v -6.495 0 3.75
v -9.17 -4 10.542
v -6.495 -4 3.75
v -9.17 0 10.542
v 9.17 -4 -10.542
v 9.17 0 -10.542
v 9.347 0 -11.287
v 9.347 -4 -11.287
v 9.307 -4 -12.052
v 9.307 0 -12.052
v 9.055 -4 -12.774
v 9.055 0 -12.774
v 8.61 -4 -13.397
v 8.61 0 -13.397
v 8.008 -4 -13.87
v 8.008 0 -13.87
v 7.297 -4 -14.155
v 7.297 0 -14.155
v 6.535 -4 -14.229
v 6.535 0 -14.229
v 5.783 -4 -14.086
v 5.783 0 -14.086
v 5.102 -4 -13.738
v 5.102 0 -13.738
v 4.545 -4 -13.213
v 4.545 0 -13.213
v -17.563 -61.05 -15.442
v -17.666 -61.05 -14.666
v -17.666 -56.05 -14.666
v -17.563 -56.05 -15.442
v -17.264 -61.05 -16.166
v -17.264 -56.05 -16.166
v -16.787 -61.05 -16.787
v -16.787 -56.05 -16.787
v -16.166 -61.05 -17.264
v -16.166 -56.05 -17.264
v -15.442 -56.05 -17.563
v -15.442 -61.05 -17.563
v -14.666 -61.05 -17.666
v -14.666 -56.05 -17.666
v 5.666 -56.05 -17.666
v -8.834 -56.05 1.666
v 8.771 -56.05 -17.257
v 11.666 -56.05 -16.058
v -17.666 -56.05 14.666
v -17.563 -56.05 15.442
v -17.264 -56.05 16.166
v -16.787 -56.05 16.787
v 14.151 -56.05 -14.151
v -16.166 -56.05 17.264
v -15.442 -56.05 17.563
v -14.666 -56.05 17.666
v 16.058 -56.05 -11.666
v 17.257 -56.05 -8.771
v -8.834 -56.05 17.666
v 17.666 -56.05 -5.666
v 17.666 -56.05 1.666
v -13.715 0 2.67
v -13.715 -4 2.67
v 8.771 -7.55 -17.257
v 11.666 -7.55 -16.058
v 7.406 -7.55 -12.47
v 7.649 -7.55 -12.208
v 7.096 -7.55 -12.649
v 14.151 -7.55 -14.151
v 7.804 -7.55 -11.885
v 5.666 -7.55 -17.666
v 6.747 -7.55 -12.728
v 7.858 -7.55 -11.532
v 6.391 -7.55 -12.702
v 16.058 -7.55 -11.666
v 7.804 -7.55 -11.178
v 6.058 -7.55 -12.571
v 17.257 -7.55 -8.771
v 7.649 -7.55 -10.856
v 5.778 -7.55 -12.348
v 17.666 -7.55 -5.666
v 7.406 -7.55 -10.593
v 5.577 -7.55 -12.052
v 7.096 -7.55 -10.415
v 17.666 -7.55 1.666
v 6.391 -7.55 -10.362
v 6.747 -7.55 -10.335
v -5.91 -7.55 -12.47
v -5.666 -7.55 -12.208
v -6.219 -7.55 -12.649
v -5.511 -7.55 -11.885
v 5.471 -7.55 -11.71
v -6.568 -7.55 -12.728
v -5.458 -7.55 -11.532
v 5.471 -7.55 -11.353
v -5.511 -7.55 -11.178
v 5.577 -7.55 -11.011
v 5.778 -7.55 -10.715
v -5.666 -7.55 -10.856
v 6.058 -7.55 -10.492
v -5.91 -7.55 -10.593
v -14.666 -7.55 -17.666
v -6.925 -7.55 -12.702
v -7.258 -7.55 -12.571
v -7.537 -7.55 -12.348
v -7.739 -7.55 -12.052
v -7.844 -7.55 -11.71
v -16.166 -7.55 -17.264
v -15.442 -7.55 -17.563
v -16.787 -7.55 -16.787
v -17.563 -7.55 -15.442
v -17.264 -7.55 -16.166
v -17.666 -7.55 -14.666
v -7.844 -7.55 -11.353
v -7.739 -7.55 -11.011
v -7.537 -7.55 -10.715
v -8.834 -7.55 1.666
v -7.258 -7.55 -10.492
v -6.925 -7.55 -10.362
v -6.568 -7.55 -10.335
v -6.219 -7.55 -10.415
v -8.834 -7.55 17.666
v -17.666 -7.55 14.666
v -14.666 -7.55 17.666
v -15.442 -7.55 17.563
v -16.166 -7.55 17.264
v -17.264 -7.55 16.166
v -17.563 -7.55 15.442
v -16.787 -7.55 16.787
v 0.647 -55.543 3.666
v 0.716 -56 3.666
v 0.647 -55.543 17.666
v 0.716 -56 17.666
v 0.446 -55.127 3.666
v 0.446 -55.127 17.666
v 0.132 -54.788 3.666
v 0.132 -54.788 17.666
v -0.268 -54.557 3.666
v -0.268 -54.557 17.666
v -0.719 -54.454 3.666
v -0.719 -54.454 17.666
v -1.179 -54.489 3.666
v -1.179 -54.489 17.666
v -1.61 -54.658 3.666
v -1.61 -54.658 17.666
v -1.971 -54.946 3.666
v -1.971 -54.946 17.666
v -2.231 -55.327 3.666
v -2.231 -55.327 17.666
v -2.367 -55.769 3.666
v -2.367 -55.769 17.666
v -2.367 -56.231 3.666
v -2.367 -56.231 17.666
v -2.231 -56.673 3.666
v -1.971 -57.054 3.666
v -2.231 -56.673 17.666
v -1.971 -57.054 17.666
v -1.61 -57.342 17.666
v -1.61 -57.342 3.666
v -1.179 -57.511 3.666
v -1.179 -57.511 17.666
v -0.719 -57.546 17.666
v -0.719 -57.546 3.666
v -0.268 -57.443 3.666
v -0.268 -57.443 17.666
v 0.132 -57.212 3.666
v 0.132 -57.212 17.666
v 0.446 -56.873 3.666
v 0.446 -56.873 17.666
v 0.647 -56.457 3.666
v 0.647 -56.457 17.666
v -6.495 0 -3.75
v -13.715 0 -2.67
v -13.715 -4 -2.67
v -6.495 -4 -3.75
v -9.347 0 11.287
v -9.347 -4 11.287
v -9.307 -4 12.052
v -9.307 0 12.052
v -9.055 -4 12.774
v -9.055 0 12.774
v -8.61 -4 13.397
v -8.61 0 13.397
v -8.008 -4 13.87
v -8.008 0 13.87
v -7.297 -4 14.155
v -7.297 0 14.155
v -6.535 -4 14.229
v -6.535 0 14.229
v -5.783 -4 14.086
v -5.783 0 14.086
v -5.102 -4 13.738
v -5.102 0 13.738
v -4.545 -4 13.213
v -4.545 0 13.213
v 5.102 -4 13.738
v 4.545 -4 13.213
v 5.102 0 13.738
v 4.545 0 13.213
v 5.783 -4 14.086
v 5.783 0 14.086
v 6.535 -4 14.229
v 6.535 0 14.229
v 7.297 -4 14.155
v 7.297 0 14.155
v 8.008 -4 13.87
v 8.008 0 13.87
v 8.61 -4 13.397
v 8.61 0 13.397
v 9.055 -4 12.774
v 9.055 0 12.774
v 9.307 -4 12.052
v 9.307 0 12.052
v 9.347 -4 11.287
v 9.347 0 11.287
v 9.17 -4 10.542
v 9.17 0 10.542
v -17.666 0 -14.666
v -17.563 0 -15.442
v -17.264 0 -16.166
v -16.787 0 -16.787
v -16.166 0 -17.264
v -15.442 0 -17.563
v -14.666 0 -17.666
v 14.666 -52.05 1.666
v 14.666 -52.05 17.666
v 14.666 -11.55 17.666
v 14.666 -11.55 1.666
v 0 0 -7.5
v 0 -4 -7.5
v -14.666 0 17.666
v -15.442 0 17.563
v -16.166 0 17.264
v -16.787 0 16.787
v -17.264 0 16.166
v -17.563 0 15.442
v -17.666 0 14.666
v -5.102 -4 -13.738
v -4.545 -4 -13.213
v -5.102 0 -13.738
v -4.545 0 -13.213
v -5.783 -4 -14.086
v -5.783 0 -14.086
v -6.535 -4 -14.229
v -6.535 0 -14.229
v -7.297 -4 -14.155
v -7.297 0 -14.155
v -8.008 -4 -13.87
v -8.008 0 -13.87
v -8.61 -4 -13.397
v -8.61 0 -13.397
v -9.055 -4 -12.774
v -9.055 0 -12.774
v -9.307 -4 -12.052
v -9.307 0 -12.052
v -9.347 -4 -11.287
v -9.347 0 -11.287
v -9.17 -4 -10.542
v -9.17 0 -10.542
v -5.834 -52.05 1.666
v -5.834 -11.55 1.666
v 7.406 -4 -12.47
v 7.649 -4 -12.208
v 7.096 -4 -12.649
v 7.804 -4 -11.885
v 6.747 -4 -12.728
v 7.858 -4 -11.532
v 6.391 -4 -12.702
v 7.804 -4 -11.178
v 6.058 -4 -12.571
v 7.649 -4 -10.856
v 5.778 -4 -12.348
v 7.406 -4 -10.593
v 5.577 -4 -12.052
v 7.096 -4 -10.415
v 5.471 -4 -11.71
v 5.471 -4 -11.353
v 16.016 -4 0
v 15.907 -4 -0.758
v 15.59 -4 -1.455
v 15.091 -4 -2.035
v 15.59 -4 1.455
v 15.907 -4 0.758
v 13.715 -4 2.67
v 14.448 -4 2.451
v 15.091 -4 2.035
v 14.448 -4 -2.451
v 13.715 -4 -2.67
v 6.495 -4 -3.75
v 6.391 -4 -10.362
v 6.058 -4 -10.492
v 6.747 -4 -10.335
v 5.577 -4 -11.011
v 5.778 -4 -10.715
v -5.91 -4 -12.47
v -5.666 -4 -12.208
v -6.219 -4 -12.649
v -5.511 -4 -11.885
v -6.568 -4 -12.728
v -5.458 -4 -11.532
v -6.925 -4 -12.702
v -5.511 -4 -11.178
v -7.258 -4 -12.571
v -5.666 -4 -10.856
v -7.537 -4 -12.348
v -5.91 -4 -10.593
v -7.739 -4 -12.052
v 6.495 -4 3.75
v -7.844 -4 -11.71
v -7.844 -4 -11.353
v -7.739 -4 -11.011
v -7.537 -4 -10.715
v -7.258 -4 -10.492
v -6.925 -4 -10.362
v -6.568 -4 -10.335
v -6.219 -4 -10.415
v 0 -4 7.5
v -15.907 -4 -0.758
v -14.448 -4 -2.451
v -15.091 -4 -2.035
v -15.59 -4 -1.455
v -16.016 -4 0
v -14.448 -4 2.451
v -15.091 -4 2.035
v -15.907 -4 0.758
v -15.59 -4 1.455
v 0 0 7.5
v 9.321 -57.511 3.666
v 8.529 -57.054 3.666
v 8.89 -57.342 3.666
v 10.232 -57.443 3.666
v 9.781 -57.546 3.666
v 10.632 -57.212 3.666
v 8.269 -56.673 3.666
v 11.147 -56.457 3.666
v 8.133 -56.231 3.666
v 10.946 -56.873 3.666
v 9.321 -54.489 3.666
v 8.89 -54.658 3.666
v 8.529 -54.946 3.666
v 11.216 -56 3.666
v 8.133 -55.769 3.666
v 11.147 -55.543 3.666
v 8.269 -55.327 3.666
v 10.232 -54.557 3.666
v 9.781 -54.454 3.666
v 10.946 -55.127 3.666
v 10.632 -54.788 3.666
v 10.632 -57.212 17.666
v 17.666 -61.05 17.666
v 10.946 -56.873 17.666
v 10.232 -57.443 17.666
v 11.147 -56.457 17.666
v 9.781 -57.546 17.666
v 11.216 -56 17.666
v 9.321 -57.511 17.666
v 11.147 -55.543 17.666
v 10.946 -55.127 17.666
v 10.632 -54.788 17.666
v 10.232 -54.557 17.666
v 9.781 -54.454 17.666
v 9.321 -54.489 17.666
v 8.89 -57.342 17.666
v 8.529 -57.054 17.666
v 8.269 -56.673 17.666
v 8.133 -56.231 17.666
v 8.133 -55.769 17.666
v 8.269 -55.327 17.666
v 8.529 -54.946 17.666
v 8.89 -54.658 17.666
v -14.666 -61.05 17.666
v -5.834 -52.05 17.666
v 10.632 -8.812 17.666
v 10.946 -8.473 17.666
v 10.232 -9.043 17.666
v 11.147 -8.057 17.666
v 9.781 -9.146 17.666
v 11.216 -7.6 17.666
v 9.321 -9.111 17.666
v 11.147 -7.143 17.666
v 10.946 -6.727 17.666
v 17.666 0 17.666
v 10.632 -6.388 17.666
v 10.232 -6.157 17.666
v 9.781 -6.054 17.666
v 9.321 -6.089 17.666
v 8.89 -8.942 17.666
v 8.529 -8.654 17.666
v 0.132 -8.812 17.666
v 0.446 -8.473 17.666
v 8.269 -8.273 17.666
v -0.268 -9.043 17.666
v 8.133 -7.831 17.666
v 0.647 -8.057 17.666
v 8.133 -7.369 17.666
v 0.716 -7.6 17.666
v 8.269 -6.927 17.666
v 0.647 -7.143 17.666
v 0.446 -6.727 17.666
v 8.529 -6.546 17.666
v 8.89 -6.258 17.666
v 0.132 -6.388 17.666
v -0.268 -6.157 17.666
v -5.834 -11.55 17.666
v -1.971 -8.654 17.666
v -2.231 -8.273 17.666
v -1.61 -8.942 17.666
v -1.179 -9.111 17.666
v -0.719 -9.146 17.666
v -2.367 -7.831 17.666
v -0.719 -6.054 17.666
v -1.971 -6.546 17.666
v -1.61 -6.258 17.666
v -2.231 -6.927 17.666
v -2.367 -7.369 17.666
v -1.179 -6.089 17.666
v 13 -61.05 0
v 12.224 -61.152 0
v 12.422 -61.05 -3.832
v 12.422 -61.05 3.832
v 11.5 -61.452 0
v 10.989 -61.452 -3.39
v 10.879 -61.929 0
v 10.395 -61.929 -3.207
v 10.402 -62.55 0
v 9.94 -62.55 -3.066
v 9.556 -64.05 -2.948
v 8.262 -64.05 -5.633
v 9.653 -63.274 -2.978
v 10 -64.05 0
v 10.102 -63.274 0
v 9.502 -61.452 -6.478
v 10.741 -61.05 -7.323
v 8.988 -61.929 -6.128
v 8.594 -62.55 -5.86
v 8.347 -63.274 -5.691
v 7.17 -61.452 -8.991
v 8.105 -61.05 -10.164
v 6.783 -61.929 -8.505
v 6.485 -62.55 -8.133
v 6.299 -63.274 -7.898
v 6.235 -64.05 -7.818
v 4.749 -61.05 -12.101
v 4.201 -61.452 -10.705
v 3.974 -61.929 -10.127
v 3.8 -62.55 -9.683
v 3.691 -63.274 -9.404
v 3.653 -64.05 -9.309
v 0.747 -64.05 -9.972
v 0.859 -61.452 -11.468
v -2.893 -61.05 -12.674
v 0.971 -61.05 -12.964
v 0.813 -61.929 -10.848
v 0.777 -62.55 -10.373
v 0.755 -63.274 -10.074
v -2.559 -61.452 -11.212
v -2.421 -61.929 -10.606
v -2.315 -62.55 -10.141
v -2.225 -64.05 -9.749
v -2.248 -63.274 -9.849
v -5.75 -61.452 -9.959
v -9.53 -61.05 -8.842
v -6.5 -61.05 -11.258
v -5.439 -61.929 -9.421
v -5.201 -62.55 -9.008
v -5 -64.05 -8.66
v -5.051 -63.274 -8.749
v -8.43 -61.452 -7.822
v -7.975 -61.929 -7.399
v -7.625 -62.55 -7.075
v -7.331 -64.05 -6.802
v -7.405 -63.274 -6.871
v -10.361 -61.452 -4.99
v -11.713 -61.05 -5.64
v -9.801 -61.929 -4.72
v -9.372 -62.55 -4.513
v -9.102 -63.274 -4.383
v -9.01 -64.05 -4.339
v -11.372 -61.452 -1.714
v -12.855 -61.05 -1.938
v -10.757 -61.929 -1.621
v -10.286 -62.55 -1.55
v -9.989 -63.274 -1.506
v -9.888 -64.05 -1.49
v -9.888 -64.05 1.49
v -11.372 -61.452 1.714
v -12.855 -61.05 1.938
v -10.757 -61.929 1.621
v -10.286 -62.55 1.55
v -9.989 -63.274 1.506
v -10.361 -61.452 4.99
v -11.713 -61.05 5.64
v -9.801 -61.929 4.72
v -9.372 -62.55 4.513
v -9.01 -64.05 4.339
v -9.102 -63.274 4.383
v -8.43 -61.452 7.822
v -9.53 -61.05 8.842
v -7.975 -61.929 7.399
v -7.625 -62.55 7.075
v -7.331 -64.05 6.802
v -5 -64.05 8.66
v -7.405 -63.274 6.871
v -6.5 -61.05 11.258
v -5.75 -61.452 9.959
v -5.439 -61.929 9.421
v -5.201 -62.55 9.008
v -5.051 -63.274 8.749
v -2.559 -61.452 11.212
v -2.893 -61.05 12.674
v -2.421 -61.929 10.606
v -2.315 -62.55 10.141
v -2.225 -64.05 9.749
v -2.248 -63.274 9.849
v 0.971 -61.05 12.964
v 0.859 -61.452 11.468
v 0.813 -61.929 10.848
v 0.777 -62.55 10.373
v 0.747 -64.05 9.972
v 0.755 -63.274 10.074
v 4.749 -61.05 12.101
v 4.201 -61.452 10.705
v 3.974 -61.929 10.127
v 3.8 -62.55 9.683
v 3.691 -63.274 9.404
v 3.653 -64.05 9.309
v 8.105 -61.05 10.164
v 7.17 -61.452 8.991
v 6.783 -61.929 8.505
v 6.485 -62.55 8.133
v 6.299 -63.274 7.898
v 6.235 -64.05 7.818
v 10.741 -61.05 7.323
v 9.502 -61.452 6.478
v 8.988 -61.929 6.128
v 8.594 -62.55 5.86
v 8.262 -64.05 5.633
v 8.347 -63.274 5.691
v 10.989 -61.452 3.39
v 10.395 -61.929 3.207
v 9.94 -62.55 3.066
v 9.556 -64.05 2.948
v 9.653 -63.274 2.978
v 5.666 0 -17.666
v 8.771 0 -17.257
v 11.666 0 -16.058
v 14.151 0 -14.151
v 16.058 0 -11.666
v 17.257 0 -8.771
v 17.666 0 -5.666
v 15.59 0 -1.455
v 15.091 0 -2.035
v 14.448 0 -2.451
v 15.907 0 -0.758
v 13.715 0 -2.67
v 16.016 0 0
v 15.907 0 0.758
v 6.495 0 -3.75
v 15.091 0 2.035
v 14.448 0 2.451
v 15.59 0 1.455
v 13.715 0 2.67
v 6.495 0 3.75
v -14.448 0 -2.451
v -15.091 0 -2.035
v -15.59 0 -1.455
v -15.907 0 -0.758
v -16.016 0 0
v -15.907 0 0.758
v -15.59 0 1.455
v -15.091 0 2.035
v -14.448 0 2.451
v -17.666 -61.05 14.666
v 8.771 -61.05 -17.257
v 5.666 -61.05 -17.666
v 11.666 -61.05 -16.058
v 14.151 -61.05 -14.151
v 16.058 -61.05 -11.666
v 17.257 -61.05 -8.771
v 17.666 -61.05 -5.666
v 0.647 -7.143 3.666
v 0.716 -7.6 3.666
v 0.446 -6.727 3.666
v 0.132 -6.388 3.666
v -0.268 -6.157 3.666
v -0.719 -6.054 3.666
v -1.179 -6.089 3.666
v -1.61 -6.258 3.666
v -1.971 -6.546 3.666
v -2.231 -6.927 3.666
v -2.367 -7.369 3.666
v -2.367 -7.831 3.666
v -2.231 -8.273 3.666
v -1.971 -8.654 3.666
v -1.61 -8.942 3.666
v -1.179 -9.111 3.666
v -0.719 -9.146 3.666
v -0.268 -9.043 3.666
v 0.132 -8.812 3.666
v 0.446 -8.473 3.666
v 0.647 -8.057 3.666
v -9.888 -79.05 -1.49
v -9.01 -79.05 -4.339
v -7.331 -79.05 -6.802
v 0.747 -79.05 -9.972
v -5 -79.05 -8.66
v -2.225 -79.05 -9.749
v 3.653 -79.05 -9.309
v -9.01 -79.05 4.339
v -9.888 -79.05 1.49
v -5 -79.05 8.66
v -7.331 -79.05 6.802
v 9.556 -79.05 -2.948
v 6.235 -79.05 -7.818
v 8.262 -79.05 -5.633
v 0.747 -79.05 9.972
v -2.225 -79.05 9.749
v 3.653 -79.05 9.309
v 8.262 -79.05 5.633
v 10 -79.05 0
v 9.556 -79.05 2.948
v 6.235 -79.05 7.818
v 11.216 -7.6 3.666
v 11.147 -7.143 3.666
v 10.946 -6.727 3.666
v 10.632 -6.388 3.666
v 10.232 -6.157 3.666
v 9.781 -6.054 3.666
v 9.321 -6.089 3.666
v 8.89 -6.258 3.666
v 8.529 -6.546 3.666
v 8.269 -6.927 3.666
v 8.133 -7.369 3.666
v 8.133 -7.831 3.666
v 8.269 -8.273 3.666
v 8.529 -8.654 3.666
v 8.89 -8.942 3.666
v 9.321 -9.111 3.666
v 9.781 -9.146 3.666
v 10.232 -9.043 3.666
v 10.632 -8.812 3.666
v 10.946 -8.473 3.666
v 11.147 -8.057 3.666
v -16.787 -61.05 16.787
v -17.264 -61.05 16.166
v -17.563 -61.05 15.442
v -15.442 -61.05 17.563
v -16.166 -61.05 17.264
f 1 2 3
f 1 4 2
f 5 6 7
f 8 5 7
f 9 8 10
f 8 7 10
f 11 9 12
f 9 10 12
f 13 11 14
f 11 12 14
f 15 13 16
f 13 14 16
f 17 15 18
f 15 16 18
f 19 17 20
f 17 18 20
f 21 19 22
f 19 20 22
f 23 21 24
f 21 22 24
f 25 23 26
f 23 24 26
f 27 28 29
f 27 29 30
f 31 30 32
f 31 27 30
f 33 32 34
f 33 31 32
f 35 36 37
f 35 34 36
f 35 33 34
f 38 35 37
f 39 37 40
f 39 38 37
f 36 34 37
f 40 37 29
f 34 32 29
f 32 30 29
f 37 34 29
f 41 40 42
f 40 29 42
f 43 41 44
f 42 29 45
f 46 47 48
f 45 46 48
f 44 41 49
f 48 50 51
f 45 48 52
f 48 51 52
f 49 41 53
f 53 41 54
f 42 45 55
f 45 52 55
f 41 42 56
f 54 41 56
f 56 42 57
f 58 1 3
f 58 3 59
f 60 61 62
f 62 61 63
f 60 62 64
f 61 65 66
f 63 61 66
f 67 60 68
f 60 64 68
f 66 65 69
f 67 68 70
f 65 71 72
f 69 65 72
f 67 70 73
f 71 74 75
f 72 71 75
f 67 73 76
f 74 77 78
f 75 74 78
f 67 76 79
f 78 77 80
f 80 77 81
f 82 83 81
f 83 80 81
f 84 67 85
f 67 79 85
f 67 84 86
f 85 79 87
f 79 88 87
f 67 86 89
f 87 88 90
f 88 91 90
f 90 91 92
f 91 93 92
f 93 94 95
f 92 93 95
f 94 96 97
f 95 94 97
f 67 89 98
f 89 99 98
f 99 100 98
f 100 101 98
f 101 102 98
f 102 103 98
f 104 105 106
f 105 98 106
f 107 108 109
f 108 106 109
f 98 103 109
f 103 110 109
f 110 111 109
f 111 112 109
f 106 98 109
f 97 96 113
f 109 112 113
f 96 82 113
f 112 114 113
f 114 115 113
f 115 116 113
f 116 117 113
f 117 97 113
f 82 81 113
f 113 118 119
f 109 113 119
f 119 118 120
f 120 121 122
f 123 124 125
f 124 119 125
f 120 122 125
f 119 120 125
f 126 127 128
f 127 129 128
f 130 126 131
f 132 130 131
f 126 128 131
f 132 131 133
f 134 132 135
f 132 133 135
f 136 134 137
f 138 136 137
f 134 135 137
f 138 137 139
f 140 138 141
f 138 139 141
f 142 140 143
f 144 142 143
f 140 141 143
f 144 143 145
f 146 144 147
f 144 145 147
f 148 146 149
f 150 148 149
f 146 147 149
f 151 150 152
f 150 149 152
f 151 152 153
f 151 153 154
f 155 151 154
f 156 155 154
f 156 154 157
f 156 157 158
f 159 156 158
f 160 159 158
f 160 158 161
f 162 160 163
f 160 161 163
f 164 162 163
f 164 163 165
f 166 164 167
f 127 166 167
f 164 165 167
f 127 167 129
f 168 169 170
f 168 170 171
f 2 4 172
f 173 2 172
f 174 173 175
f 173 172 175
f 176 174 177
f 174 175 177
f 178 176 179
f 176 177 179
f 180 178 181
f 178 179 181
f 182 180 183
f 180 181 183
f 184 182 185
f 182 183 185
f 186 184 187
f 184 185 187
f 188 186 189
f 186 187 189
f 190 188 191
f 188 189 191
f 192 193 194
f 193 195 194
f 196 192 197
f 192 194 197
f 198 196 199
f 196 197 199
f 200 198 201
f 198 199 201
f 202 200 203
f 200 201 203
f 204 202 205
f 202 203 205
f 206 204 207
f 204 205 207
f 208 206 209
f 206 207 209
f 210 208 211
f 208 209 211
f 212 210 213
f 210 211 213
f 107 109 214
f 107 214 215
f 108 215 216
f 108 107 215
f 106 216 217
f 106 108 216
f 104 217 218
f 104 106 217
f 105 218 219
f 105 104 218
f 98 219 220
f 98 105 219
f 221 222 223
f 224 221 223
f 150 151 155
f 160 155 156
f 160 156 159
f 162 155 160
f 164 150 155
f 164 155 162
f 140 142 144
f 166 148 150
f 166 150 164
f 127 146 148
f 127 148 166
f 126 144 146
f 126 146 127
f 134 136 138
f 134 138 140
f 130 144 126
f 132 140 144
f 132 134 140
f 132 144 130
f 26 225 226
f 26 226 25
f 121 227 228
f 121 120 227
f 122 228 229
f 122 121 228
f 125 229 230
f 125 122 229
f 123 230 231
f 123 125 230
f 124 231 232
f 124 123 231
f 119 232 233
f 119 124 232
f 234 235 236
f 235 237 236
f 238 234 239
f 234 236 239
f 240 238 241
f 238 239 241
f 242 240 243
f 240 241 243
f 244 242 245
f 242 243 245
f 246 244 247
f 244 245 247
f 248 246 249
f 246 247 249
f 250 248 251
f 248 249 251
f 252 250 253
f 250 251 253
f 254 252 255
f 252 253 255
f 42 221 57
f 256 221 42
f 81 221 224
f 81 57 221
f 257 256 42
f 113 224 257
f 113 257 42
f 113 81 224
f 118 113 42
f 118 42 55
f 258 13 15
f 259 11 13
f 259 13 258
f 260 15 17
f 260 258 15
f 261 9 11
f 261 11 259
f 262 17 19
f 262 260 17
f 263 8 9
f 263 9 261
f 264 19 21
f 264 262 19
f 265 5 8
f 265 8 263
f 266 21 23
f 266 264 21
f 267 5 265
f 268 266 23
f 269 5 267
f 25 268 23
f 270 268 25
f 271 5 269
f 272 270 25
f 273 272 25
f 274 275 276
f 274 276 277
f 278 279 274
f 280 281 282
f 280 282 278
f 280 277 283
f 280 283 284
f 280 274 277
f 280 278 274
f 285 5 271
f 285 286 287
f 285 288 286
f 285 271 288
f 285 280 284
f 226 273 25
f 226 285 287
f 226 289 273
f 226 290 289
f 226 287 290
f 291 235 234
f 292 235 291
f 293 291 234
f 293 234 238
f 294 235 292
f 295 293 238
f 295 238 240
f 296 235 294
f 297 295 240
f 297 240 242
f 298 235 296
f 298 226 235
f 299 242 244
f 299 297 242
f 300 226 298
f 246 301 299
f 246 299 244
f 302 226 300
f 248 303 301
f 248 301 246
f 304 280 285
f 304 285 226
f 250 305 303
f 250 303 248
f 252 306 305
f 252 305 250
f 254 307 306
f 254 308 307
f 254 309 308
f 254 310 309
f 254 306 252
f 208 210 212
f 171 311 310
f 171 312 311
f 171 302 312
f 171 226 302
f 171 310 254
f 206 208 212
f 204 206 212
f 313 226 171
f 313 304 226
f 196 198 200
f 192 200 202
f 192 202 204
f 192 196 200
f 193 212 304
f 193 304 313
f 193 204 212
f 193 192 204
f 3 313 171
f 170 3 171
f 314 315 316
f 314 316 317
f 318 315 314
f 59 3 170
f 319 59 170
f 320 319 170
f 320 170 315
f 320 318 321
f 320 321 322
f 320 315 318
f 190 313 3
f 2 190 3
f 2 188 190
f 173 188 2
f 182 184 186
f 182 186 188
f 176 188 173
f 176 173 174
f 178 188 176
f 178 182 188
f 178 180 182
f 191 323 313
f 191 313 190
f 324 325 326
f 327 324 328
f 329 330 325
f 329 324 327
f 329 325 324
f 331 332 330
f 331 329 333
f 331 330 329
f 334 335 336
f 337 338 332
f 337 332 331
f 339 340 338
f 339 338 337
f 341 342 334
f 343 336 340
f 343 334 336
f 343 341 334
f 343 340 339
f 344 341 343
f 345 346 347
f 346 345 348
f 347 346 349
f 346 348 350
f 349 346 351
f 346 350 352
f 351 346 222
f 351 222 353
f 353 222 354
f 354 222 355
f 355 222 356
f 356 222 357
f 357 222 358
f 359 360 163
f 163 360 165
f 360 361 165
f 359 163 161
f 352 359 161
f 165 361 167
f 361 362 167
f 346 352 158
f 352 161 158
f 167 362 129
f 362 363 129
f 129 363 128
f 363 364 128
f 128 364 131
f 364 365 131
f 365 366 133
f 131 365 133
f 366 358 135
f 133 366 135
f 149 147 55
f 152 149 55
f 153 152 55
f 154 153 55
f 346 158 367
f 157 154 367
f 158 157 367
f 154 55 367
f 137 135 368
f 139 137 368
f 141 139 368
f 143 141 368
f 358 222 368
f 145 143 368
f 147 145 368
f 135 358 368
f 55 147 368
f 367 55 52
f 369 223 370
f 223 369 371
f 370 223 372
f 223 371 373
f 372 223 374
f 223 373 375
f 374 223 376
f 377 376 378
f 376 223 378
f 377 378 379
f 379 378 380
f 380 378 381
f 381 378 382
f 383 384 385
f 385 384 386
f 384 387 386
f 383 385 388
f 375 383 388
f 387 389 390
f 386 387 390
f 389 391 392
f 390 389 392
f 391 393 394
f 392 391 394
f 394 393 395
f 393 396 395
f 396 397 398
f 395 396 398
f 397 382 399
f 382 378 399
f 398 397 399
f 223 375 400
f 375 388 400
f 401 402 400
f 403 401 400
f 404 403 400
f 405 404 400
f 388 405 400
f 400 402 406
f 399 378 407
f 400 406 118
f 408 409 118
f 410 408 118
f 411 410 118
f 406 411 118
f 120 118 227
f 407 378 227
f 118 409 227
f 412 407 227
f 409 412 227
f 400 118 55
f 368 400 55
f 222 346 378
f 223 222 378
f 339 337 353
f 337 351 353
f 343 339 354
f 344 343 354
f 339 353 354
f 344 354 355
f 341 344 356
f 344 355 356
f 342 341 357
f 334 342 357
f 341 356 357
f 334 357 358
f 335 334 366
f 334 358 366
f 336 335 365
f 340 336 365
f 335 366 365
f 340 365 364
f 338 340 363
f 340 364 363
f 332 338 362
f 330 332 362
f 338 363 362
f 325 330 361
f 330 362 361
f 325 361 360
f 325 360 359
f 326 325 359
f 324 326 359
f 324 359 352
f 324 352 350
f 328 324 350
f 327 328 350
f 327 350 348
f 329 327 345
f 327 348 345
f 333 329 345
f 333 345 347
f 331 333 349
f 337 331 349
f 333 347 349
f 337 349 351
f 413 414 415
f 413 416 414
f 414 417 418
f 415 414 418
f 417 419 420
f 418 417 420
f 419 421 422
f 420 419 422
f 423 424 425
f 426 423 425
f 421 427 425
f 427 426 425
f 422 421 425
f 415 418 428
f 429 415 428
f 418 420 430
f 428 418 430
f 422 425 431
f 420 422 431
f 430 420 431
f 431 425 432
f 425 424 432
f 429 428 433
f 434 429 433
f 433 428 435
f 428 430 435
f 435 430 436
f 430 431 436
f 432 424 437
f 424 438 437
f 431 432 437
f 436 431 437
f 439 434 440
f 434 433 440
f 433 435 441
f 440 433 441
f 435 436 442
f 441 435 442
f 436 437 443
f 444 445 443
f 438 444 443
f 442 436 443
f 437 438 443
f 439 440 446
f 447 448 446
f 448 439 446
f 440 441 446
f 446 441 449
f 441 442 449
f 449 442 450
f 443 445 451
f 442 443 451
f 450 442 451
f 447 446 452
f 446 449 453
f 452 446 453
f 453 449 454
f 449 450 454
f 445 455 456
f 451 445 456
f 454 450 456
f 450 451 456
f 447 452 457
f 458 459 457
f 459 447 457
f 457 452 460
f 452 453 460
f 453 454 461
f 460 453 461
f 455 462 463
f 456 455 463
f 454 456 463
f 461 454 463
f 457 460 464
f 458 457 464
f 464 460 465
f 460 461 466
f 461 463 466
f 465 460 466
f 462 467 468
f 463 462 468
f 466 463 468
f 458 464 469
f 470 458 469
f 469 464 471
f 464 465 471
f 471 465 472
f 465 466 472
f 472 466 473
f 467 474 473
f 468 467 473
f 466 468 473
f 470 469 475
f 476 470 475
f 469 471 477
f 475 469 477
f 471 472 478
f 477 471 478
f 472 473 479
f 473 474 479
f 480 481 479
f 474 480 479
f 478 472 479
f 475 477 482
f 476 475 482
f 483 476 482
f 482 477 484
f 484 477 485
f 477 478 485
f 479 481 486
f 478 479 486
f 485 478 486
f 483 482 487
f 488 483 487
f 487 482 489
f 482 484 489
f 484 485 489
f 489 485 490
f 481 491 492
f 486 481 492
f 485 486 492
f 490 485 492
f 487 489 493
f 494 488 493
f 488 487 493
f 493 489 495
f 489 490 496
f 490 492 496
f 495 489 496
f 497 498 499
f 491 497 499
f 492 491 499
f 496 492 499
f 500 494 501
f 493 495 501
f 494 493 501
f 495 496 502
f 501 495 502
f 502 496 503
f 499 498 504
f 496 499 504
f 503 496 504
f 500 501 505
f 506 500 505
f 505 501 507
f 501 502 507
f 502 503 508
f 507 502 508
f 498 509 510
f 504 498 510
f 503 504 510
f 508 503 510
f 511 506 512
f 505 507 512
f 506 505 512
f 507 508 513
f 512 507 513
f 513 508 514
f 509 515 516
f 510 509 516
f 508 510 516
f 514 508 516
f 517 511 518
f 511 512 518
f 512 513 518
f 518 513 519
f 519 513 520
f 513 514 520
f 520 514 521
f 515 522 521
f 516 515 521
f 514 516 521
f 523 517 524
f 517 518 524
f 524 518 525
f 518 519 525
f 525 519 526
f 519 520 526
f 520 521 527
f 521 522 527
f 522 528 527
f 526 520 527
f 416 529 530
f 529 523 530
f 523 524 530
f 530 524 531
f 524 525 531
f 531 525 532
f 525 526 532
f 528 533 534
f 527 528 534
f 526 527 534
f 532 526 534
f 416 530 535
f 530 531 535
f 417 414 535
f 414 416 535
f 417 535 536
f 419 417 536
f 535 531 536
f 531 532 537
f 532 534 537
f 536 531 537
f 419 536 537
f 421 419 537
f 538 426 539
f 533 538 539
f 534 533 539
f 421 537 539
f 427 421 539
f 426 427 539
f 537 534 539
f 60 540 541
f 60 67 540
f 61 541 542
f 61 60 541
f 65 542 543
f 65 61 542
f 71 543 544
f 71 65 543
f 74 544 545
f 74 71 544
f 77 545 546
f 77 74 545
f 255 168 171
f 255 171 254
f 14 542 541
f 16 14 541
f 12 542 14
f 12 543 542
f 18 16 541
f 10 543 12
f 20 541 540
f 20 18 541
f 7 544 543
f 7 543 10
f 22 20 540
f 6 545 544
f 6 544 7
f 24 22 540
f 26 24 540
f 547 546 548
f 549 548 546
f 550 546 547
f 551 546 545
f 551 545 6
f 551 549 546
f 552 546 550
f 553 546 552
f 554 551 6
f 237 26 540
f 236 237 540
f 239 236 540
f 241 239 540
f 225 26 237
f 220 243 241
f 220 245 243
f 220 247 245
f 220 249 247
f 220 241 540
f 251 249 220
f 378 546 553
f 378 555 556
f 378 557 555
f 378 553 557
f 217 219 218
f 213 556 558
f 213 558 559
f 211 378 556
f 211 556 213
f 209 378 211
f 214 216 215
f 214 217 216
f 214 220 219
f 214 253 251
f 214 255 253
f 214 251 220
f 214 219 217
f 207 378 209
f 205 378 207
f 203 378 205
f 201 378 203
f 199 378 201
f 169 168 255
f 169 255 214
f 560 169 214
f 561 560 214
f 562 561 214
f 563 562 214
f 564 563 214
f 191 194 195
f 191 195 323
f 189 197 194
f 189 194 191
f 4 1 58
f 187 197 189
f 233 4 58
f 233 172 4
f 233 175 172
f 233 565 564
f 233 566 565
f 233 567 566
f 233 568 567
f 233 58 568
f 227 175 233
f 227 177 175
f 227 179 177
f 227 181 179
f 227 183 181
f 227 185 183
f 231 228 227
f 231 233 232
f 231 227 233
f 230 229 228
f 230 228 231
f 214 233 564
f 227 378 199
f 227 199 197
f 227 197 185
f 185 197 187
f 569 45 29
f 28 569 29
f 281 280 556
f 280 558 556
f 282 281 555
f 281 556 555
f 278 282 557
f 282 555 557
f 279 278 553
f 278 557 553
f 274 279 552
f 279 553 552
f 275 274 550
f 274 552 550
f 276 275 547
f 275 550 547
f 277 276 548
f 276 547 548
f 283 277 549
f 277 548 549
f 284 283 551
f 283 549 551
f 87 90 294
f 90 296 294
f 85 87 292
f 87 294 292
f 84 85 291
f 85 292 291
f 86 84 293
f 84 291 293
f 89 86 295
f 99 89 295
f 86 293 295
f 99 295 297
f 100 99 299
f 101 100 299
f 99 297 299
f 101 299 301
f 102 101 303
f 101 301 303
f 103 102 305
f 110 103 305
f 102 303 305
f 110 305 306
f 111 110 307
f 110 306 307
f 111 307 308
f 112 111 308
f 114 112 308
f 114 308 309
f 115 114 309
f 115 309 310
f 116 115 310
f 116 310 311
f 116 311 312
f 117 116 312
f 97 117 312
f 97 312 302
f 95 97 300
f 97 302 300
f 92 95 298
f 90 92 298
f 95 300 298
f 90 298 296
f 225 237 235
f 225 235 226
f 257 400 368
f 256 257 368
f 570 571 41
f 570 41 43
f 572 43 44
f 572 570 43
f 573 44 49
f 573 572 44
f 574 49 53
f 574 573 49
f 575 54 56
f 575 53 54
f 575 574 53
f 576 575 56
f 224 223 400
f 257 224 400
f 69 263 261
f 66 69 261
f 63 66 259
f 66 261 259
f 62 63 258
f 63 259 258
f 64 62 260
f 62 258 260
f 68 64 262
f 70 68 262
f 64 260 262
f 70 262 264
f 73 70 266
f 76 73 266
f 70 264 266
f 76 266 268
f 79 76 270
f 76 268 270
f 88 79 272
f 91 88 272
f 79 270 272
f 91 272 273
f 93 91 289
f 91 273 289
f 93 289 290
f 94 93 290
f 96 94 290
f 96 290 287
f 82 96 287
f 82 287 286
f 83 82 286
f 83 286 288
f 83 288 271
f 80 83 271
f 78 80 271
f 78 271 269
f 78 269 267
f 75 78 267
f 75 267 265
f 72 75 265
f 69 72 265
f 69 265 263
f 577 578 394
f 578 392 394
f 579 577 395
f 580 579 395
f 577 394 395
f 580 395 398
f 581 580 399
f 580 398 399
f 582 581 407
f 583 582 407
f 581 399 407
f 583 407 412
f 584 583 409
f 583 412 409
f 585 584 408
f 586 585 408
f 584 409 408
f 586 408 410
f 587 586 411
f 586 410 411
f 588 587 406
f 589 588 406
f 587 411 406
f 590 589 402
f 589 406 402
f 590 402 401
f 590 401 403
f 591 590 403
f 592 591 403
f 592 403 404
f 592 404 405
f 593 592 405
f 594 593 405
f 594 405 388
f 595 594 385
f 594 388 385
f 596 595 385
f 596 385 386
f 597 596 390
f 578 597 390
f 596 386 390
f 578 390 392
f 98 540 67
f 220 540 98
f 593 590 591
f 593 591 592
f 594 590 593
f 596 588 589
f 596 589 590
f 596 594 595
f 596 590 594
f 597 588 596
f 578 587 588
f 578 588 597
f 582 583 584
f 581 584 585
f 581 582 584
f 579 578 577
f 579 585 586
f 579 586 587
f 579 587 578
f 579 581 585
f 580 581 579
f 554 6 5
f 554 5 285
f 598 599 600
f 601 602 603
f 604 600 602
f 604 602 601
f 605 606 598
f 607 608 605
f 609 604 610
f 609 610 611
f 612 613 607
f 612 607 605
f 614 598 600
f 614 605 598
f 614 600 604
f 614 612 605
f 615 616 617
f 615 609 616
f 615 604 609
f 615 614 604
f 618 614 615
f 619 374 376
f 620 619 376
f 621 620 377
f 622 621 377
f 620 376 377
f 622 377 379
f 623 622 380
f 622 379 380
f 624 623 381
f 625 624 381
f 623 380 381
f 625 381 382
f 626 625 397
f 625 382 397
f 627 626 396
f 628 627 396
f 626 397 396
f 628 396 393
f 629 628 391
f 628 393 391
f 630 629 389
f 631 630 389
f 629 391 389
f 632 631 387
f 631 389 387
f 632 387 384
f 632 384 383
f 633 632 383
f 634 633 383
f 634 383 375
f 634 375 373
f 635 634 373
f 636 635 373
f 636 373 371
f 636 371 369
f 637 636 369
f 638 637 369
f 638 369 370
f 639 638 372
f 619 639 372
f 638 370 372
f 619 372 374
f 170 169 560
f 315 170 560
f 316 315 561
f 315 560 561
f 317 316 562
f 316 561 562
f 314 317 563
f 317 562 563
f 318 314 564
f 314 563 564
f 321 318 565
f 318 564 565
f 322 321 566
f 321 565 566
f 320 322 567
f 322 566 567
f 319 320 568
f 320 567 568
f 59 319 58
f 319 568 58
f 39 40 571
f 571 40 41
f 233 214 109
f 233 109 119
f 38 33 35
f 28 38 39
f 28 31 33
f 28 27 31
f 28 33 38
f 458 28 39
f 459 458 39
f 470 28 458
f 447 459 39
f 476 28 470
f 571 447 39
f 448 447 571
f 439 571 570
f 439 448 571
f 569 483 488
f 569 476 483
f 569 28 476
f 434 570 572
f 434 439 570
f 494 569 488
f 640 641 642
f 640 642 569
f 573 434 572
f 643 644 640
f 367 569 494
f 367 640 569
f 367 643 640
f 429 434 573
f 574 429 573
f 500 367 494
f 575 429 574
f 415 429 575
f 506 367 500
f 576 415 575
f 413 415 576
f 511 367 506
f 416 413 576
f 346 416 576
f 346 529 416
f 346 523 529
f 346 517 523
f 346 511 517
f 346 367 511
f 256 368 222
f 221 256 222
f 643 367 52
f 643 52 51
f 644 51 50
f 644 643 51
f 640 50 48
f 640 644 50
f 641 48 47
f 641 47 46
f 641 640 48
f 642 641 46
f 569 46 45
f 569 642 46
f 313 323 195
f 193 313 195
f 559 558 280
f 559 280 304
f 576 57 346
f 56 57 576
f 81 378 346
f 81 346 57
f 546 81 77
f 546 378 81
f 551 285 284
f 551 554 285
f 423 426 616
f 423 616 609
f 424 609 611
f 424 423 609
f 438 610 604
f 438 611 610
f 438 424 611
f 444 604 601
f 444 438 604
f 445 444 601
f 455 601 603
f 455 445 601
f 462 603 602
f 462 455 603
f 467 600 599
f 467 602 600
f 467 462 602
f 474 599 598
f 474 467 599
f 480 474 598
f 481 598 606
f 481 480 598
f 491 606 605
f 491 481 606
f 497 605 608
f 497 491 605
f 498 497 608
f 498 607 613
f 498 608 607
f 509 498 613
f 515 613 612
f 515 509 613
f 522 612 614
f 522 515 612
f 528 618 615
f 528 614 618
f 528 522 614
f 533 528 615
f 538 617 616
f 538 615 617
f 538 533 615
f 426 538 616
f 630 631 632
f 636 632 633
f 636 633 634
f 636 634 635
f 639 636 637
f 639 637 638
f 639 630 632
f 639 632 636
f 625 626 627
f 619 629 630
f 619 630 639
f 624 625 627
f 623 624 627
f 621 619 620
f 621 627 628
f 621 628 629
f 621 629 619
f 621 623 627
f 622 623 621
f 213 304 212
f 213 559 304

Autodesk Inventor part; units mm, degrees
ref_plane "YZ Plane" through (0, 0, 0) normal (1, 0, 0) x (0, 1, 0)
ref_plane "XZ Plane" through (0, 0, 0) normal (0, 1, 0) x (-1, 0, 0)
ref_plane "XY Plane" through (0, 0, 0) normal (0, 0, 1) x (1, 0, 0)
sketch "Boceto1" plane through (0, 0, 0) normal (0, 1, 0) x (-1, 0, 0)
  circle A0 centre (0, 0) radius 7.5 construction
  line L0 (0, 7.5) -> (4.5449, 13.2126)
  arc A1 (9.17, 10.5423) -> (4.5449, 13.2126) centre (6.6578, 11.5316) ccw
  line L1 (9.17, 10.5423) -> (6.4952, 3.75)
  line L2 (6.4952, 3.75) -> (13.7149, 2.6703)
  arc A2 (13.7149, -2.6703) -> (13.7149, 2.6703) centre (13.3156, 0) ccw
  line L3 (13.7149, -2.6703) -> (6.4952, -3.75)
  line L4 (6.4952, -3.75) -> (9.17, -10.5423)
  arc A3 (4.5449, -13.2126) -> (9.17, -10.5423) centre (6.6578, -11.5316) ccw
  line L5 (4.5449, -13.2126) -> (0, -7.5)
  line L6 (0, -7.5) -> (-4.5449, -13.2126)
  arc A4 (-9.17, -10.5423) -> (-4.5449, -13.2126) centre (-6.6578, -11.5316) ccw
  line L7 (-9.17, -10.5423) -> (-6.4952, -3.75)
  line L8 (-6.4952, -3.75) -> (-13.7149, -2.6703)
  arc A5 (-13.7149, 2.6703) -> (-13.7149, -2.6703) centre (-13.3156, 0) ccw
  line L9 (-13.7149, 2.6703) -> (-6.4952, 3.75)
  line L10 (-6.4952, 3.75) -> (-9.17, 10.5423)
  line L11 (0, 7.5) -> (-4.5449, 13.2126)
  arc A6 (-4.5449, 13.2126) -> (-9.17, 10.5423) centre (-6.6578, 11.5316) ccw
  dimension "d6" = 15
  dimension "d11" = 2.7
  dimension "d12" = 7.3
  dimension "d13" = 60
sketch "Boceto2" plane through (0, 0, 0) normal (0, 1, 0) x (-1, 0, 0)
  line L0 (17.6656, 17.6656) -> (-17.6656, 17.6656)
  line L1 (-17.6656, 17.6656) -> (-17.6656, -17.6656)
  line L2 (-17.6656, -17.6656) -> (17.6656, -17.6656)
  line L3 (17.6656, -17.6656) -> (17.6656, 17.6656)
  arc A0 (-13.7149, 2.6703) -> (-13.7149, -2.6703) centre (-13.3156, 0) ccw projected
  point P0 (0, 0)
  point P1 (0, -17.6656)
  point P2 (17.6656, 0)
  dimension "d14" = 4.35
  dimension "profundidad_hombro" = 35.3311
extrude "Extrusión1" add sketch "Boceto2" against normal blind 7.55
extrude "Extrusión2" cut sketch "Boceto1" against normal blind 4
sketch "Boceto3" plane through (0, -7.55, 0) normal (0, -1, 0) x (1, 0, 0)
  line L0 (17.6656, -17.6656) -> (-17.6656, -17.6656) construction
  line L1 (-8.8344, 17.6656) -> (17.6656, 17.6656)
  line L2 (17.6656, 17.6656) -> (17.6656, 1.6656)
  line L3 (17.6656, 1.6656) -> (-8.8344, 1.6656)
  line L4 (-8.8344, 1.6656) -> (-8.8344, 17.6656)
  line L5 (17.6656, 17.6656) -> (-17.6656, 17.6656) projected
  line L6 (17.6656, 17.6656) -> (-17.6656, 17.6656) projected
  line L7 (-17.6656, 17.6656) -> (-17.6656, -17.6656) projected
  line L8 (-17.6656, -17.6656) -> (17.6656, -17.6656) projected
  line L9 (17.6656, -17.6656) -> (17.6656, 17.6656) projected
  point P0 (0, 0)
  point P1 (-2.7738, 1.6656)
  dimension "d20" = 16
  dimension "d59" = 26.5
extrude "Extrusión3" add sketch "Boceto3" along normal blind 48.5 contours L1 L2 L3 L4
sketch "Boceto4" plane through (0, -56.05, 0) normal (0, -1, 0) x (1, 0, 0)
  line L0 (17.6656, 17.6656) -> (17.6656, -17.6656) projected
  line L1 (-17.6656, -17.6656) -> (17.6656, -17.6656)
  line L2 (17.6656, -17.6656) -> (17.6656, 17.6656)
  line L3 (17.6656, 17.6656) -> (-17.6656, 17.6656)
  line L4 (-17.6656, 17.6656) -> (-17.6656, -17.6656)
  point P0 (0, 0)
extrude "Extrusión4" add sketch "Boceto4" along normal blind 5
sketch "Boceto5" plane through (0, -61.05, 0) normal (0, -1, 0) x (1, 0, 0)
  circle A0 centre (0, 0) radius 10
  dimension "diametro_eje_hombro" = 20
extrude "Extrusión5" add sketch "Boceto5" along normal blind 18
sketch "Sketch11" plane through (-17.6656, 0, 17.6656) normal (0, 0, 1) x (1, 0, 0)
  line L0 (11.8311, -52.05) -> (32.3311, -52.05)
  line L1 (32.3311, -52.05) -> (32.3311, -11.55)
  line L2 (32.3311, -11.55) -> (11.8311, -11.55)
  line L3 (11.8311, -11.55) -> (11.8311, -52.05)
  line L4 (8.8311, -7.55) -> (8.8311, -56.05) projected
  line L5 (35.3311, 0) -> (35.3311, -61.05) projected
  point P0 (17.6656, 0)
  point P1 (11.8311, -31.8)
  point P2 (8.8311, -31.8)
  dimension "d60" = 40.5
  dimension "d61" = 3
  dimension "d62" = 3
extrude "Extrusion12" cut sketch "Sketch11" against normal up to surface (16 mm away)
sketch "Sketch12" plane through (-17.6656, 0, 17.6656) normal (0, 0, 1) x (1, 0, 0)
  circle A0 centre (16.8311, -56) radius 1.55
  circle A1 centre (27.3311, -56) radius 1.55
  circle A2 centre (27.3311, -7.6) radius 1.55
  circle A3 centre (16.8311, -7.6) radius 1.55
  line L0 (32.3311, -52.05) -> (11.8311, -52.05) projected
  line L1 (11.8311, -11.55) -> (32.3311, -11.55) projected
  line L2 (32.3311, -11.55) -> (32.3311, -52.05) projected
  line L3 (11.8311, -52.05) -> (11.8311, -11.55) projected
  point P0 (17.6656, 0)
  dimension "d65" = 3.1
  dimension "d66" = 3.95
  dimension "d67" = 3.95
  dimension "d68" = 5
  dimension "d69" = 5
extrude "Extrusion13" cut sketch "Sketch12" against normal blind 14 contours A0 | A1 | A2 | A3
fillet "Fillet2" radius 12 2 edges at (17.6656, -3.775, -17.6656) (17.6656, -58.55, -17.6656)
fillet "Fillet3" radius 3 5 edges at (-10, -61.05, 0) (-17.6656, -58.55, 17.6656) (-17.6656, -3.775, 17.6656) (-17.6656, -3.775, -17.6656) (-17.6656, -58.55, -17.6656)
sketch "Sketch15" plane through (0, -4, 0) normal (0, 1, 0) x (1, 0, 0)
  arc A0 (-4.5449, 13.2126) -> (-9.17, 10.5423) centre (-6.6578, 11.5316) ccw projected
  circle A1 centre (-6.6578, 11.5316) radius 1.2
  arc A2 (9.17, 10.5423) -> (4.5449, 13.2126) centre (6.6578, 11.5316) ccw projected
  circle A3 centre (6.6578, 11.5316) radius 1.2
  point P0 (0, 0)
  dimension "d78" = 1.5
extrude "Extrusion15" cut sketch "Sketch15" against normal blind 10
equation "\"d12\" = largo_petalo"
equation "\"d62\" = d61"
equation "\"d67\" = d66"
equation "\"largo_petalo\" = 7.3"
properties part number "Pata - Hombro"
